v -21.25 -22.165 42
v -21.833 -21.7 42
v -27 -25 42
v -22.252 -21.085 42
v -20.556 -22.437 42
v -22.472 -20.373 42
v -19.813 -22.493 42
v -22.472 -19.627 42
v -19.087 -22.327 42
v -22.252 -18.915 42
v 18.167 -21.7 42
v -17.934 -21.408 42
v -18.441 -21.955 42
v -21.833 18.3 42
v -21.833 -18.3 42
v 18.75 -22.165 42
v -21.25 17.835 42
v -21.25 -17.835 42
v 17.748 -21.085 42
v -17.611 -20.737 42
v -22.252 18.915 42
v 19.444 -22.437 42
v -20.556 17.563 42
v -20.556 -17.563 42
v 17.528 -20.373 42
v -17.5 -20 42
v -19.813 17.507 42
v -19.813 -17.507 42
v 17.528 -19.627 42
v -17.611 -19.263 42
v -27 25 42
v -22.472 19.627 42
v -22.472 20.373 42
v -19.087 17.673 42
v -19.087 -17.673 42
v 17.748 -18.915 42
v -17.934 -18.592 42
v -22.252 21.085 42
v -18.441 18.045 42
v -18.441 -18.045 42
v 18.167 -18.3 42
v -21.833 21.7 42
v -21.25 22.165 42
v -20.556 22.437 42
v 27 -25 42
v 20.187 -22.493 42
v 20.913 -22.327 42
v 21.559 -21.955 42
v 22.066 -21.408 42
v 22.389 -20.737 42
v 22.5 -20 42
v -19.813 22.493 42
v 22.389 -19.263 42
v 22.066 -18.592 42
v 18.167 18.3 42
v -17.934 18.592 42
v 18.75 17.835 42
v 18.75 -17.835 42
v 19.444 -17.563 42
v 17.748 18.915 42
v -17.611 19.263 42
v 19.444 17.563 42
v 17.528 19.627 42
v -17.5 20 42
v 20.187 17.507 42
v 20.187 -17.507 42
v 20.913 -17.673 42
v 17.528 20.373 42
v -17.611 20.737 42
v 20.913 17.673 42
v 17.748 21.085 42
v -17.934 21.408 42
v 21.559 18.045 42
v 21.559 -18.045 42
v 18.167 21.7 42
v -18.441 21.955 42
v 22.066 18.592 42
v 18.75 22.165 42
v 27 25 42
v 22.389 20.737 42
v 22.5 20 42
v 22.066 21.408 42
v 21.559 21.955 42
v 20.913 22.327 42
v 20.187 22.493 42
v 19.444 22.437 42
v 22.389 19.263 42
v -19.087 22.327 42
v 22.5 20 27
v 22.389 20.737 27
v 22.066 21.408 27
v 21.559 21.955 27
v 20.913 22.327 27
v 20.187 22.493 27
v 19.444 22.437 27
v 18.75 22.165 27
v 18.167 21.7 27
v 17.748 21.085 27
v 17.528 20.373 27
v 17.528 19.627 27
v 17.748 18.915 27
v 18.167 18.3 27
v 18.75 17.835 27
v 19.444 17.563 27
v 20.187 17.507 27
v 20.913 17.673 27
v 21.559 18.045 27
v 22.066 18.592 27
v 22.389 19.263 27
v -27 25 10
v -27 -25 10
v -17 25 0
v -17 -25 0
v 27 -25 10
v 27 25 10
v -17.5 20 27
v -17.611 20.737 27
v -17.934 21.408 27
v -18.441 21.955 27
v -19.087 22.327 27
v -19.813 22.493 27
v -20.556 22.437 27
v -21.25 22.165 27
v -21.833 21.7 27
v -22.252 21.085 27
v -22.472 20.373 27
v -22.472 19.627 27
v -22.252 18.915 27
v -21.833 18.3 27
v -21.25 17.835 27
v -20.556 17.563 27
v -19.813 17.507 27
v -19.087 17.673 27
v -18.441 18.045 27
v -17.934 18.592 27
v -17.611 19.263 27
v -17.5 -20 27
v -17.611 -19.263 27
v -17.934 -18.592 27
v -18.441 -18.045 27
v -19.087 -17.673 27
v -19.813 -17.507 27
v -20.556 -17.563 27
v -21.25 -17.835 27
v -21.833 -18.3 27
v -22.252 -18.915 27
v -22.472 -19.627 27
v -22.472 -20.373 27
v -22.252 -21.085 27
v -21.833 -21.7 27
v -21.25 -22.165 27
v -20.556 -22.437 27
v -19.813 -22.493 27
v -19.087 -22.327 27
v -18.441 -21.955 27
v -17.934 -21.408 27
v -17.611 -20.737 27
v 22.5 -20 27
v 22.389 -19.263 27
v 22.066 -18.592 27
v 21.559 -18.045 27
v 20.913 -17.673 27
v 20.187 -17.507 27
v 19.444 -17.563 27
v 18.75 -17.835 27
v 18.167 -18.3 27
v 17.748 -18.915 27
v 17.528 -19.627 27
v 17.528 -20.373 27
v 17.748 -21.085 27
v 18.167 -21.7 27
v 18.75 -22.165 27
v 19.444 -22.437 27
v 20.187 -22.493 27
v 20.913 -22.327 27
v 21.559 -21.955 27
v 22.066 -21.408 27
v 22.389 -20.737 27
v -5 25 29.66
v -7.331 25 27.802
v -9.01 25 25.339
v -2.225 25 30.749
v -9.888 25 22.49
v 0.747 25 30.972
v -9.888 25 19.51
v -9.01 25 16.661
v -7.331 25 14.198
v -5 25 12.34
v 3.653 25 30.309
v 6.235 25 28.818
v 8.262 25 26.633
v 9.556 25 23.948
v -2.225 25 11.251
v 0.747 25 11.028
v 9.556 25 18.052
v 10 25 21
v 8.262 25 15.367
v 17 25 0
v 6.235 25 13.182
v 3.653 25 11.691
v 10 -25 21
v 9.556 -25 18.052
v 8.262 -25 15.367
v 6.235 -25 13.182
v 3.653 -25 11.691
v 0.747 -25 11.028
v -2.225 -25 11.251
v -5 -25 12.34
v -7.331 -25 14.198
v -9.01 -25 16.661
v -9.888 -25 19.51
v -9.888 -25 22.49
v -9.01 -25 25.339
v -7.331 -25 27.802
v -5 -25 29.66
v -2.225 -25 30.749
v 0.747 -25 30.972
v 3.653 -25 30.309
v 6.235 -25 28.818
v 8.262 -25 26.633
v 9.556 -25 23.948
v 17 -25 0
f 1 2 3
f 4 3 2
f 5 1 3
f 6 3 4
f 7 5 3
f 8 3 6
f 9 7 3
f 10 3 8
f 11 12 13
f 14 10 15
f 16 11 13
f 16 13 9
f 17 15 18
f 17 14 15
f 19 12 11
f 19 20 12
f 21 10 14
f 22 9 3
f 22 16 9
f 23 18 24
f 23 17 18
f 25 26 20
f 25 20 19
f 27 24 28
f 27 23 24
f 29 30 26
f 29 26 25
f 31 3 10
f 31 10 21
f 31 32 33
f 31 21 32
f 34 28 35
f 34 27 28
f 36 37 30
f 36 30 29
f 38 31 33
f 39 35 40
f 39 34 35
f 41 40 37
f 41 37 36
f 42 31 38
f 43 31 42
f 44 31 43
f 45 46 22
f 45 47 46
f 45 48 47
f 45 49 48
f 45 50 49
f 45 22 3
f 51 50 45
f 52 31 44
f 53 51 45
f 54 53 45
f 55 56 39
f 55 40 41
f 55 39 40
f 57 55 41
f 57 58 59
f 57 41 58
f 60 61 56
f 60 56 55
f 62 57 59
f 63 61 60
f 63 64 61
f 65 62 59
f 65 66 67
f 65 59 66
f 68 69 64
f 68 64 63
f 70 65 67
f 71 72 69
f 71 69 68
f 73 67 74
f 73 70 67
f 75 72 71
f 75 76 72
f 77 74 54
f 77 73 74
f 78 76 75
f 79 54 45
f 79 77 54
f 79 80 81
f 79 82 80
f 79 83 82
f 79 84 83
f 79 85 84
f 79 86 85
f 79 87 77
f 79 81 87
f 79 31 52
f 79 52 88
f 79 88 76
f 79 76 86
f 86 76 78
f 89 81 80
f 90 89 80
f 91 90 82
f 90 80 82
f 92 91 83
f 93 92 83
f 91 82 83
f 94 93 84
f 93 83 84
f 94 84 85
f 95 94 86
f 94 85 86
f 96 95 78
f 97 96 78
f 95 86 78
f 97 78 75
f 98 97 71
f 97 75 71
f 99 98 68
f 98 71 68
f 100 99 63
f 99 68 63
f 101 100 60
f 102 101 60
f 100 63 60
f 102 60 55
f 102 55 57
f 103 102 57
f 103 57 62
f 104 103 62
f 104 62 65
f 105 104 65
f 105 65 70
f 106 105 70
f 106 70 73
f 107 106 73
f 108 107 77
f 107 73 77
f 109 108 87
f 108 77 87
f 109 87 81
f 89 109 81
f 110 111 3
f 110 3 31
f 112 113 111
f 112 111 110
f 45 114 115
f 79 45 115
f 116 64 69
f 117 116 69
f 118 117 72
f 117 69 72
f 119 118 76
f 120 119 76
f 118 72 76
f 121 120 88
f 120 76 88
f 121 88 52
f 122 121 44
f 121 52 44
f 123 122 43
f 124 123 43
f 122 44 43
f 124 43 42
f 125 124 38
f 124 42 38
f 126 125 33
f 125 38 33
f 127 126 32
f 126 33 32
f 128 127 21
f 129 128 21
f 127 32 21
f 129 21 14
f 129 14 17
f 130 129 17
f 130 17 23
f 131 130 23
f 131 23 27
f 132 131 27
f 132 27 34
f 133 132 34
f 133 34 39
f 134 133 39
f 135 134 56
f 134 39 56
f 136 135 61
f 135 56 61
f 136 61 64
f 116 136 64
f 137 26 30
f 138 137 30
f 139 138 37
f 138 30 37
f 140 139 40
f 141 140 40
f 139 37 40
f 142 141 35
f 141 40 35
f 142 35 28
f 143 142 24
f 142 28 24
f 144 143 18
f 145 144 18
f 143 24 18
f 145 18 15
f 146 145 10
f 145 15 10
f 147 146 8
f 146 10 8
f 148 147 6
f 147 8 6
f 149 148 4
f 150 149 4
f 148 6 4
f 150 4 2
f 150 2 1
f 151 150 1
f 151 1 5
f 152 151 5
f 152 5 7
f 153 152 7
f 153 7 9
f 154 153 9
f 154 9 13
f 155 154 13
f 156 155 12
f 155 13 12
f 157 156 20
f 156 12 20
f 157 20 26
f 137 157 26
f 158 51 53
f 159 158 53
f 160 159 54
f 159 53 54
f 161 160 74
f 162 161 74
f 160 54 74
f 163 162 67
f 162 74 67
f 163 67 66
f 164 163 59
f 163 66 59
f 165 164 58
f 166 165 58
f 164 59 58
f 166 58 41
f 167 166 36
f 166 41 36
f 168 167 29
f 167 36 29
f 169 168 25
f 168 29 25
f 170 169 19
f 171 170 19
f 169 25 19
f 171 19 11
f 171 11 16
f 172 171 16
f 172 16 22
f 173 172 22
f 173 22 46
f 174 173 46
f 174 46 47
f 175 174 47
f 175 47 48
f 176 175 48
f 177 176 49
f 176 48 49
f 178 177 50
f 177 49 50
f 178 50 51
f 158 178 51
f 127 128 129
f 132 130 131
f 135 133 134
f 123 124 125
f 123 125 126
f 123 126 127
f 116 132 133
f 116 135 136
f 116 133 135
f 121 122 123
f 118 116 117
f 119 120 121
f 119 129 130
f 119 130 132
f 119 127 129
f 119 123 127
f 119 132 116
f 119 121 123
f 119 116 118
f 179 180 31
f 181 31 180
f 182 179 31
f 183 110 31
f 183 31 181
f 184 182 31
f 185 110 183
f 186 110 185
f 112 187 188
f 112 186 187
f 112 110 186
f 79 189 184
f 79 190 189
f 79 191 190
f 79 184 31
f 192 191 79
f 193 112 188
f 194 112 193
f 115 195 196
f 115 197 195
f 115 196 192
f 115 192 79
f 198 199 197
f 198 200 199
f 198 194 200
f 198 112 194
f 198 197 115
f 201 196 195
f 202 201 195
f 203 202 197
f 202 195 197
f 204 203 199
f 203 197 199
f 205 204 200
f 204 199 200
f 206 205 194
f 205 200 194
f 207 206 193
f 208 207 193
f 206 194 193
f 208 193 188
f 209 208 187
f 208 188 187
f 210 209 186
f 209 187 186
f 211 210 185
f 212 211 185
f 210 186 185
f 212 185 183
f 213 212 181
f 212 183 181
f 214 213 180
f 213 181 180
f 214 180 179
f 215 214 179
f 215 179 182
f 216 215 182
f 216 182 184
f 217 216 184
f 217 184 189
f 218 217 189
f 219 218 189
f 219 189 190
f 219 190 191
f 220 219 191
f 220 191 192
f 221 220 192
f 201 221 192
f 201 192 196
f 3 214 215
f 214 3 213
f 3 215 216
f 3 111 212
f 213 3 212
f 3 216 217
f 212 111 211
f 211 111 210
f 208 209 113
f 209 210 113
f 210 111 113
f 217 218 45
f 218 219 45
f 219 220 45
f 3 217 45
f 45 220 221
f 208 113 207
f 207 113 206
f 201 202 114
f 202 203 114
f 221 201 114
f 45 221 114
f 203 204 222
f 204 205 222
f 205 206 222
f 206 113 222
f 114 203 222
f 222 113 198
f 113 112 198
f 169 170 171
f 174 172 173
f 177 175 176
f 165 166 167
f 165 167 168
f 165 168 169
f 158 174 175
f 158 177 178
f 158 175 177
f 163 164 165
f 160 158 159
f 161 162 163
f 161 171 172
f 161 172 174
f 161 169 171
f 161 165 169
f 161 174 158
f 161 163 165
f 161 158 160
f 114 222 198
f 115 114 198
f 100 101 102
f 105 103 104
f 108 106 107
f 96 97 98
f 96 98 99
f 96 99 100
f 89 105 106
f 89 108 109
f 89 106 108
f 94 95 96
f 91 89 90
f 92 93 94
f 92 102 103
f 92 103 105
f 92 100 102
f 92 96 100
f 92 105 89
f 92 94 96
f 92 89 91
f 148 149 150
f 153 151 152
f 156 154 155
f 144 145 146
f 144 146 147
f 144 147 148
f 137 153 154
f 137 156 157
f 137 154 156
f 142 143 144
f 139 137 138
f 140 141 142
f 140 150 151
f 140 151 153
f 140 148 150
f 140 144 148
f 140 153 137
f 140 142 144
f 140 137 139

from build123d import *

# Parameters (mm, degrees)
SKETCH1_W           = 54
SKETCH1_H           = 50
BOSS_EXTRUDE1_DEPTH = 42
CHAMFER1_SIZE       = 10
SKETCH2_R           = 10
CUT_EXTRUDE1_DEPTH  = 51
SKETCH3_R           = 2.5
CUT_EXTRUDE2_DEPTH  = 15


with BuildPart() as part:
    # Sketch1 → Boss-Extrude1 (new body)
    with BuildSketch(Plane.XY):
        Rectangle(SKETCH1_W, SKETCH1_H)
    extrude(amount=BOSS_EXTRUDE1_DEPTH)

    # Chamfer1
    chamfer1_edges = [part.edges().sort_by_distance(p)[0] for p in [
        (27, 0, 0),
        (-27, 0, 0),
    ]]
    chamfer(chamfer1_edges, length=CHAMFER1_SIZE)

    # Sketch2 → Cut-Extrude1 (cut, through all)
    with BuildSketch(Plane(origin=(0, 25, 0), x_dir=(1, 0, 0), z_dir=(0, 1, 0))):
        with Locations((0, -21)):
            Circle(SKETCH2_R)
    extrude(amount=-CUT_EXTRUDE1_DEPTH, mode=Mode.SUBTRACT)

    # Sketch3 → Cut-Extrude2 (cut)
    with BuildSketch(Plane.XY.offset(42)):
        with Locations((-20, 20)):
            Circle(SKETCH3_R)
        with Locations((20, 20)):
            Circle(SKETCH3_R)
        with Locations((-20, -20)):
            Circle(SKETCH3_R)
        with Locations((20, -20)):
            Circle(SKETCH3_R)
    extrude(amount=-CUT_EXTRUDE2_DEPTH, mode=Mode.SUBTRACT)


solid = part.part
